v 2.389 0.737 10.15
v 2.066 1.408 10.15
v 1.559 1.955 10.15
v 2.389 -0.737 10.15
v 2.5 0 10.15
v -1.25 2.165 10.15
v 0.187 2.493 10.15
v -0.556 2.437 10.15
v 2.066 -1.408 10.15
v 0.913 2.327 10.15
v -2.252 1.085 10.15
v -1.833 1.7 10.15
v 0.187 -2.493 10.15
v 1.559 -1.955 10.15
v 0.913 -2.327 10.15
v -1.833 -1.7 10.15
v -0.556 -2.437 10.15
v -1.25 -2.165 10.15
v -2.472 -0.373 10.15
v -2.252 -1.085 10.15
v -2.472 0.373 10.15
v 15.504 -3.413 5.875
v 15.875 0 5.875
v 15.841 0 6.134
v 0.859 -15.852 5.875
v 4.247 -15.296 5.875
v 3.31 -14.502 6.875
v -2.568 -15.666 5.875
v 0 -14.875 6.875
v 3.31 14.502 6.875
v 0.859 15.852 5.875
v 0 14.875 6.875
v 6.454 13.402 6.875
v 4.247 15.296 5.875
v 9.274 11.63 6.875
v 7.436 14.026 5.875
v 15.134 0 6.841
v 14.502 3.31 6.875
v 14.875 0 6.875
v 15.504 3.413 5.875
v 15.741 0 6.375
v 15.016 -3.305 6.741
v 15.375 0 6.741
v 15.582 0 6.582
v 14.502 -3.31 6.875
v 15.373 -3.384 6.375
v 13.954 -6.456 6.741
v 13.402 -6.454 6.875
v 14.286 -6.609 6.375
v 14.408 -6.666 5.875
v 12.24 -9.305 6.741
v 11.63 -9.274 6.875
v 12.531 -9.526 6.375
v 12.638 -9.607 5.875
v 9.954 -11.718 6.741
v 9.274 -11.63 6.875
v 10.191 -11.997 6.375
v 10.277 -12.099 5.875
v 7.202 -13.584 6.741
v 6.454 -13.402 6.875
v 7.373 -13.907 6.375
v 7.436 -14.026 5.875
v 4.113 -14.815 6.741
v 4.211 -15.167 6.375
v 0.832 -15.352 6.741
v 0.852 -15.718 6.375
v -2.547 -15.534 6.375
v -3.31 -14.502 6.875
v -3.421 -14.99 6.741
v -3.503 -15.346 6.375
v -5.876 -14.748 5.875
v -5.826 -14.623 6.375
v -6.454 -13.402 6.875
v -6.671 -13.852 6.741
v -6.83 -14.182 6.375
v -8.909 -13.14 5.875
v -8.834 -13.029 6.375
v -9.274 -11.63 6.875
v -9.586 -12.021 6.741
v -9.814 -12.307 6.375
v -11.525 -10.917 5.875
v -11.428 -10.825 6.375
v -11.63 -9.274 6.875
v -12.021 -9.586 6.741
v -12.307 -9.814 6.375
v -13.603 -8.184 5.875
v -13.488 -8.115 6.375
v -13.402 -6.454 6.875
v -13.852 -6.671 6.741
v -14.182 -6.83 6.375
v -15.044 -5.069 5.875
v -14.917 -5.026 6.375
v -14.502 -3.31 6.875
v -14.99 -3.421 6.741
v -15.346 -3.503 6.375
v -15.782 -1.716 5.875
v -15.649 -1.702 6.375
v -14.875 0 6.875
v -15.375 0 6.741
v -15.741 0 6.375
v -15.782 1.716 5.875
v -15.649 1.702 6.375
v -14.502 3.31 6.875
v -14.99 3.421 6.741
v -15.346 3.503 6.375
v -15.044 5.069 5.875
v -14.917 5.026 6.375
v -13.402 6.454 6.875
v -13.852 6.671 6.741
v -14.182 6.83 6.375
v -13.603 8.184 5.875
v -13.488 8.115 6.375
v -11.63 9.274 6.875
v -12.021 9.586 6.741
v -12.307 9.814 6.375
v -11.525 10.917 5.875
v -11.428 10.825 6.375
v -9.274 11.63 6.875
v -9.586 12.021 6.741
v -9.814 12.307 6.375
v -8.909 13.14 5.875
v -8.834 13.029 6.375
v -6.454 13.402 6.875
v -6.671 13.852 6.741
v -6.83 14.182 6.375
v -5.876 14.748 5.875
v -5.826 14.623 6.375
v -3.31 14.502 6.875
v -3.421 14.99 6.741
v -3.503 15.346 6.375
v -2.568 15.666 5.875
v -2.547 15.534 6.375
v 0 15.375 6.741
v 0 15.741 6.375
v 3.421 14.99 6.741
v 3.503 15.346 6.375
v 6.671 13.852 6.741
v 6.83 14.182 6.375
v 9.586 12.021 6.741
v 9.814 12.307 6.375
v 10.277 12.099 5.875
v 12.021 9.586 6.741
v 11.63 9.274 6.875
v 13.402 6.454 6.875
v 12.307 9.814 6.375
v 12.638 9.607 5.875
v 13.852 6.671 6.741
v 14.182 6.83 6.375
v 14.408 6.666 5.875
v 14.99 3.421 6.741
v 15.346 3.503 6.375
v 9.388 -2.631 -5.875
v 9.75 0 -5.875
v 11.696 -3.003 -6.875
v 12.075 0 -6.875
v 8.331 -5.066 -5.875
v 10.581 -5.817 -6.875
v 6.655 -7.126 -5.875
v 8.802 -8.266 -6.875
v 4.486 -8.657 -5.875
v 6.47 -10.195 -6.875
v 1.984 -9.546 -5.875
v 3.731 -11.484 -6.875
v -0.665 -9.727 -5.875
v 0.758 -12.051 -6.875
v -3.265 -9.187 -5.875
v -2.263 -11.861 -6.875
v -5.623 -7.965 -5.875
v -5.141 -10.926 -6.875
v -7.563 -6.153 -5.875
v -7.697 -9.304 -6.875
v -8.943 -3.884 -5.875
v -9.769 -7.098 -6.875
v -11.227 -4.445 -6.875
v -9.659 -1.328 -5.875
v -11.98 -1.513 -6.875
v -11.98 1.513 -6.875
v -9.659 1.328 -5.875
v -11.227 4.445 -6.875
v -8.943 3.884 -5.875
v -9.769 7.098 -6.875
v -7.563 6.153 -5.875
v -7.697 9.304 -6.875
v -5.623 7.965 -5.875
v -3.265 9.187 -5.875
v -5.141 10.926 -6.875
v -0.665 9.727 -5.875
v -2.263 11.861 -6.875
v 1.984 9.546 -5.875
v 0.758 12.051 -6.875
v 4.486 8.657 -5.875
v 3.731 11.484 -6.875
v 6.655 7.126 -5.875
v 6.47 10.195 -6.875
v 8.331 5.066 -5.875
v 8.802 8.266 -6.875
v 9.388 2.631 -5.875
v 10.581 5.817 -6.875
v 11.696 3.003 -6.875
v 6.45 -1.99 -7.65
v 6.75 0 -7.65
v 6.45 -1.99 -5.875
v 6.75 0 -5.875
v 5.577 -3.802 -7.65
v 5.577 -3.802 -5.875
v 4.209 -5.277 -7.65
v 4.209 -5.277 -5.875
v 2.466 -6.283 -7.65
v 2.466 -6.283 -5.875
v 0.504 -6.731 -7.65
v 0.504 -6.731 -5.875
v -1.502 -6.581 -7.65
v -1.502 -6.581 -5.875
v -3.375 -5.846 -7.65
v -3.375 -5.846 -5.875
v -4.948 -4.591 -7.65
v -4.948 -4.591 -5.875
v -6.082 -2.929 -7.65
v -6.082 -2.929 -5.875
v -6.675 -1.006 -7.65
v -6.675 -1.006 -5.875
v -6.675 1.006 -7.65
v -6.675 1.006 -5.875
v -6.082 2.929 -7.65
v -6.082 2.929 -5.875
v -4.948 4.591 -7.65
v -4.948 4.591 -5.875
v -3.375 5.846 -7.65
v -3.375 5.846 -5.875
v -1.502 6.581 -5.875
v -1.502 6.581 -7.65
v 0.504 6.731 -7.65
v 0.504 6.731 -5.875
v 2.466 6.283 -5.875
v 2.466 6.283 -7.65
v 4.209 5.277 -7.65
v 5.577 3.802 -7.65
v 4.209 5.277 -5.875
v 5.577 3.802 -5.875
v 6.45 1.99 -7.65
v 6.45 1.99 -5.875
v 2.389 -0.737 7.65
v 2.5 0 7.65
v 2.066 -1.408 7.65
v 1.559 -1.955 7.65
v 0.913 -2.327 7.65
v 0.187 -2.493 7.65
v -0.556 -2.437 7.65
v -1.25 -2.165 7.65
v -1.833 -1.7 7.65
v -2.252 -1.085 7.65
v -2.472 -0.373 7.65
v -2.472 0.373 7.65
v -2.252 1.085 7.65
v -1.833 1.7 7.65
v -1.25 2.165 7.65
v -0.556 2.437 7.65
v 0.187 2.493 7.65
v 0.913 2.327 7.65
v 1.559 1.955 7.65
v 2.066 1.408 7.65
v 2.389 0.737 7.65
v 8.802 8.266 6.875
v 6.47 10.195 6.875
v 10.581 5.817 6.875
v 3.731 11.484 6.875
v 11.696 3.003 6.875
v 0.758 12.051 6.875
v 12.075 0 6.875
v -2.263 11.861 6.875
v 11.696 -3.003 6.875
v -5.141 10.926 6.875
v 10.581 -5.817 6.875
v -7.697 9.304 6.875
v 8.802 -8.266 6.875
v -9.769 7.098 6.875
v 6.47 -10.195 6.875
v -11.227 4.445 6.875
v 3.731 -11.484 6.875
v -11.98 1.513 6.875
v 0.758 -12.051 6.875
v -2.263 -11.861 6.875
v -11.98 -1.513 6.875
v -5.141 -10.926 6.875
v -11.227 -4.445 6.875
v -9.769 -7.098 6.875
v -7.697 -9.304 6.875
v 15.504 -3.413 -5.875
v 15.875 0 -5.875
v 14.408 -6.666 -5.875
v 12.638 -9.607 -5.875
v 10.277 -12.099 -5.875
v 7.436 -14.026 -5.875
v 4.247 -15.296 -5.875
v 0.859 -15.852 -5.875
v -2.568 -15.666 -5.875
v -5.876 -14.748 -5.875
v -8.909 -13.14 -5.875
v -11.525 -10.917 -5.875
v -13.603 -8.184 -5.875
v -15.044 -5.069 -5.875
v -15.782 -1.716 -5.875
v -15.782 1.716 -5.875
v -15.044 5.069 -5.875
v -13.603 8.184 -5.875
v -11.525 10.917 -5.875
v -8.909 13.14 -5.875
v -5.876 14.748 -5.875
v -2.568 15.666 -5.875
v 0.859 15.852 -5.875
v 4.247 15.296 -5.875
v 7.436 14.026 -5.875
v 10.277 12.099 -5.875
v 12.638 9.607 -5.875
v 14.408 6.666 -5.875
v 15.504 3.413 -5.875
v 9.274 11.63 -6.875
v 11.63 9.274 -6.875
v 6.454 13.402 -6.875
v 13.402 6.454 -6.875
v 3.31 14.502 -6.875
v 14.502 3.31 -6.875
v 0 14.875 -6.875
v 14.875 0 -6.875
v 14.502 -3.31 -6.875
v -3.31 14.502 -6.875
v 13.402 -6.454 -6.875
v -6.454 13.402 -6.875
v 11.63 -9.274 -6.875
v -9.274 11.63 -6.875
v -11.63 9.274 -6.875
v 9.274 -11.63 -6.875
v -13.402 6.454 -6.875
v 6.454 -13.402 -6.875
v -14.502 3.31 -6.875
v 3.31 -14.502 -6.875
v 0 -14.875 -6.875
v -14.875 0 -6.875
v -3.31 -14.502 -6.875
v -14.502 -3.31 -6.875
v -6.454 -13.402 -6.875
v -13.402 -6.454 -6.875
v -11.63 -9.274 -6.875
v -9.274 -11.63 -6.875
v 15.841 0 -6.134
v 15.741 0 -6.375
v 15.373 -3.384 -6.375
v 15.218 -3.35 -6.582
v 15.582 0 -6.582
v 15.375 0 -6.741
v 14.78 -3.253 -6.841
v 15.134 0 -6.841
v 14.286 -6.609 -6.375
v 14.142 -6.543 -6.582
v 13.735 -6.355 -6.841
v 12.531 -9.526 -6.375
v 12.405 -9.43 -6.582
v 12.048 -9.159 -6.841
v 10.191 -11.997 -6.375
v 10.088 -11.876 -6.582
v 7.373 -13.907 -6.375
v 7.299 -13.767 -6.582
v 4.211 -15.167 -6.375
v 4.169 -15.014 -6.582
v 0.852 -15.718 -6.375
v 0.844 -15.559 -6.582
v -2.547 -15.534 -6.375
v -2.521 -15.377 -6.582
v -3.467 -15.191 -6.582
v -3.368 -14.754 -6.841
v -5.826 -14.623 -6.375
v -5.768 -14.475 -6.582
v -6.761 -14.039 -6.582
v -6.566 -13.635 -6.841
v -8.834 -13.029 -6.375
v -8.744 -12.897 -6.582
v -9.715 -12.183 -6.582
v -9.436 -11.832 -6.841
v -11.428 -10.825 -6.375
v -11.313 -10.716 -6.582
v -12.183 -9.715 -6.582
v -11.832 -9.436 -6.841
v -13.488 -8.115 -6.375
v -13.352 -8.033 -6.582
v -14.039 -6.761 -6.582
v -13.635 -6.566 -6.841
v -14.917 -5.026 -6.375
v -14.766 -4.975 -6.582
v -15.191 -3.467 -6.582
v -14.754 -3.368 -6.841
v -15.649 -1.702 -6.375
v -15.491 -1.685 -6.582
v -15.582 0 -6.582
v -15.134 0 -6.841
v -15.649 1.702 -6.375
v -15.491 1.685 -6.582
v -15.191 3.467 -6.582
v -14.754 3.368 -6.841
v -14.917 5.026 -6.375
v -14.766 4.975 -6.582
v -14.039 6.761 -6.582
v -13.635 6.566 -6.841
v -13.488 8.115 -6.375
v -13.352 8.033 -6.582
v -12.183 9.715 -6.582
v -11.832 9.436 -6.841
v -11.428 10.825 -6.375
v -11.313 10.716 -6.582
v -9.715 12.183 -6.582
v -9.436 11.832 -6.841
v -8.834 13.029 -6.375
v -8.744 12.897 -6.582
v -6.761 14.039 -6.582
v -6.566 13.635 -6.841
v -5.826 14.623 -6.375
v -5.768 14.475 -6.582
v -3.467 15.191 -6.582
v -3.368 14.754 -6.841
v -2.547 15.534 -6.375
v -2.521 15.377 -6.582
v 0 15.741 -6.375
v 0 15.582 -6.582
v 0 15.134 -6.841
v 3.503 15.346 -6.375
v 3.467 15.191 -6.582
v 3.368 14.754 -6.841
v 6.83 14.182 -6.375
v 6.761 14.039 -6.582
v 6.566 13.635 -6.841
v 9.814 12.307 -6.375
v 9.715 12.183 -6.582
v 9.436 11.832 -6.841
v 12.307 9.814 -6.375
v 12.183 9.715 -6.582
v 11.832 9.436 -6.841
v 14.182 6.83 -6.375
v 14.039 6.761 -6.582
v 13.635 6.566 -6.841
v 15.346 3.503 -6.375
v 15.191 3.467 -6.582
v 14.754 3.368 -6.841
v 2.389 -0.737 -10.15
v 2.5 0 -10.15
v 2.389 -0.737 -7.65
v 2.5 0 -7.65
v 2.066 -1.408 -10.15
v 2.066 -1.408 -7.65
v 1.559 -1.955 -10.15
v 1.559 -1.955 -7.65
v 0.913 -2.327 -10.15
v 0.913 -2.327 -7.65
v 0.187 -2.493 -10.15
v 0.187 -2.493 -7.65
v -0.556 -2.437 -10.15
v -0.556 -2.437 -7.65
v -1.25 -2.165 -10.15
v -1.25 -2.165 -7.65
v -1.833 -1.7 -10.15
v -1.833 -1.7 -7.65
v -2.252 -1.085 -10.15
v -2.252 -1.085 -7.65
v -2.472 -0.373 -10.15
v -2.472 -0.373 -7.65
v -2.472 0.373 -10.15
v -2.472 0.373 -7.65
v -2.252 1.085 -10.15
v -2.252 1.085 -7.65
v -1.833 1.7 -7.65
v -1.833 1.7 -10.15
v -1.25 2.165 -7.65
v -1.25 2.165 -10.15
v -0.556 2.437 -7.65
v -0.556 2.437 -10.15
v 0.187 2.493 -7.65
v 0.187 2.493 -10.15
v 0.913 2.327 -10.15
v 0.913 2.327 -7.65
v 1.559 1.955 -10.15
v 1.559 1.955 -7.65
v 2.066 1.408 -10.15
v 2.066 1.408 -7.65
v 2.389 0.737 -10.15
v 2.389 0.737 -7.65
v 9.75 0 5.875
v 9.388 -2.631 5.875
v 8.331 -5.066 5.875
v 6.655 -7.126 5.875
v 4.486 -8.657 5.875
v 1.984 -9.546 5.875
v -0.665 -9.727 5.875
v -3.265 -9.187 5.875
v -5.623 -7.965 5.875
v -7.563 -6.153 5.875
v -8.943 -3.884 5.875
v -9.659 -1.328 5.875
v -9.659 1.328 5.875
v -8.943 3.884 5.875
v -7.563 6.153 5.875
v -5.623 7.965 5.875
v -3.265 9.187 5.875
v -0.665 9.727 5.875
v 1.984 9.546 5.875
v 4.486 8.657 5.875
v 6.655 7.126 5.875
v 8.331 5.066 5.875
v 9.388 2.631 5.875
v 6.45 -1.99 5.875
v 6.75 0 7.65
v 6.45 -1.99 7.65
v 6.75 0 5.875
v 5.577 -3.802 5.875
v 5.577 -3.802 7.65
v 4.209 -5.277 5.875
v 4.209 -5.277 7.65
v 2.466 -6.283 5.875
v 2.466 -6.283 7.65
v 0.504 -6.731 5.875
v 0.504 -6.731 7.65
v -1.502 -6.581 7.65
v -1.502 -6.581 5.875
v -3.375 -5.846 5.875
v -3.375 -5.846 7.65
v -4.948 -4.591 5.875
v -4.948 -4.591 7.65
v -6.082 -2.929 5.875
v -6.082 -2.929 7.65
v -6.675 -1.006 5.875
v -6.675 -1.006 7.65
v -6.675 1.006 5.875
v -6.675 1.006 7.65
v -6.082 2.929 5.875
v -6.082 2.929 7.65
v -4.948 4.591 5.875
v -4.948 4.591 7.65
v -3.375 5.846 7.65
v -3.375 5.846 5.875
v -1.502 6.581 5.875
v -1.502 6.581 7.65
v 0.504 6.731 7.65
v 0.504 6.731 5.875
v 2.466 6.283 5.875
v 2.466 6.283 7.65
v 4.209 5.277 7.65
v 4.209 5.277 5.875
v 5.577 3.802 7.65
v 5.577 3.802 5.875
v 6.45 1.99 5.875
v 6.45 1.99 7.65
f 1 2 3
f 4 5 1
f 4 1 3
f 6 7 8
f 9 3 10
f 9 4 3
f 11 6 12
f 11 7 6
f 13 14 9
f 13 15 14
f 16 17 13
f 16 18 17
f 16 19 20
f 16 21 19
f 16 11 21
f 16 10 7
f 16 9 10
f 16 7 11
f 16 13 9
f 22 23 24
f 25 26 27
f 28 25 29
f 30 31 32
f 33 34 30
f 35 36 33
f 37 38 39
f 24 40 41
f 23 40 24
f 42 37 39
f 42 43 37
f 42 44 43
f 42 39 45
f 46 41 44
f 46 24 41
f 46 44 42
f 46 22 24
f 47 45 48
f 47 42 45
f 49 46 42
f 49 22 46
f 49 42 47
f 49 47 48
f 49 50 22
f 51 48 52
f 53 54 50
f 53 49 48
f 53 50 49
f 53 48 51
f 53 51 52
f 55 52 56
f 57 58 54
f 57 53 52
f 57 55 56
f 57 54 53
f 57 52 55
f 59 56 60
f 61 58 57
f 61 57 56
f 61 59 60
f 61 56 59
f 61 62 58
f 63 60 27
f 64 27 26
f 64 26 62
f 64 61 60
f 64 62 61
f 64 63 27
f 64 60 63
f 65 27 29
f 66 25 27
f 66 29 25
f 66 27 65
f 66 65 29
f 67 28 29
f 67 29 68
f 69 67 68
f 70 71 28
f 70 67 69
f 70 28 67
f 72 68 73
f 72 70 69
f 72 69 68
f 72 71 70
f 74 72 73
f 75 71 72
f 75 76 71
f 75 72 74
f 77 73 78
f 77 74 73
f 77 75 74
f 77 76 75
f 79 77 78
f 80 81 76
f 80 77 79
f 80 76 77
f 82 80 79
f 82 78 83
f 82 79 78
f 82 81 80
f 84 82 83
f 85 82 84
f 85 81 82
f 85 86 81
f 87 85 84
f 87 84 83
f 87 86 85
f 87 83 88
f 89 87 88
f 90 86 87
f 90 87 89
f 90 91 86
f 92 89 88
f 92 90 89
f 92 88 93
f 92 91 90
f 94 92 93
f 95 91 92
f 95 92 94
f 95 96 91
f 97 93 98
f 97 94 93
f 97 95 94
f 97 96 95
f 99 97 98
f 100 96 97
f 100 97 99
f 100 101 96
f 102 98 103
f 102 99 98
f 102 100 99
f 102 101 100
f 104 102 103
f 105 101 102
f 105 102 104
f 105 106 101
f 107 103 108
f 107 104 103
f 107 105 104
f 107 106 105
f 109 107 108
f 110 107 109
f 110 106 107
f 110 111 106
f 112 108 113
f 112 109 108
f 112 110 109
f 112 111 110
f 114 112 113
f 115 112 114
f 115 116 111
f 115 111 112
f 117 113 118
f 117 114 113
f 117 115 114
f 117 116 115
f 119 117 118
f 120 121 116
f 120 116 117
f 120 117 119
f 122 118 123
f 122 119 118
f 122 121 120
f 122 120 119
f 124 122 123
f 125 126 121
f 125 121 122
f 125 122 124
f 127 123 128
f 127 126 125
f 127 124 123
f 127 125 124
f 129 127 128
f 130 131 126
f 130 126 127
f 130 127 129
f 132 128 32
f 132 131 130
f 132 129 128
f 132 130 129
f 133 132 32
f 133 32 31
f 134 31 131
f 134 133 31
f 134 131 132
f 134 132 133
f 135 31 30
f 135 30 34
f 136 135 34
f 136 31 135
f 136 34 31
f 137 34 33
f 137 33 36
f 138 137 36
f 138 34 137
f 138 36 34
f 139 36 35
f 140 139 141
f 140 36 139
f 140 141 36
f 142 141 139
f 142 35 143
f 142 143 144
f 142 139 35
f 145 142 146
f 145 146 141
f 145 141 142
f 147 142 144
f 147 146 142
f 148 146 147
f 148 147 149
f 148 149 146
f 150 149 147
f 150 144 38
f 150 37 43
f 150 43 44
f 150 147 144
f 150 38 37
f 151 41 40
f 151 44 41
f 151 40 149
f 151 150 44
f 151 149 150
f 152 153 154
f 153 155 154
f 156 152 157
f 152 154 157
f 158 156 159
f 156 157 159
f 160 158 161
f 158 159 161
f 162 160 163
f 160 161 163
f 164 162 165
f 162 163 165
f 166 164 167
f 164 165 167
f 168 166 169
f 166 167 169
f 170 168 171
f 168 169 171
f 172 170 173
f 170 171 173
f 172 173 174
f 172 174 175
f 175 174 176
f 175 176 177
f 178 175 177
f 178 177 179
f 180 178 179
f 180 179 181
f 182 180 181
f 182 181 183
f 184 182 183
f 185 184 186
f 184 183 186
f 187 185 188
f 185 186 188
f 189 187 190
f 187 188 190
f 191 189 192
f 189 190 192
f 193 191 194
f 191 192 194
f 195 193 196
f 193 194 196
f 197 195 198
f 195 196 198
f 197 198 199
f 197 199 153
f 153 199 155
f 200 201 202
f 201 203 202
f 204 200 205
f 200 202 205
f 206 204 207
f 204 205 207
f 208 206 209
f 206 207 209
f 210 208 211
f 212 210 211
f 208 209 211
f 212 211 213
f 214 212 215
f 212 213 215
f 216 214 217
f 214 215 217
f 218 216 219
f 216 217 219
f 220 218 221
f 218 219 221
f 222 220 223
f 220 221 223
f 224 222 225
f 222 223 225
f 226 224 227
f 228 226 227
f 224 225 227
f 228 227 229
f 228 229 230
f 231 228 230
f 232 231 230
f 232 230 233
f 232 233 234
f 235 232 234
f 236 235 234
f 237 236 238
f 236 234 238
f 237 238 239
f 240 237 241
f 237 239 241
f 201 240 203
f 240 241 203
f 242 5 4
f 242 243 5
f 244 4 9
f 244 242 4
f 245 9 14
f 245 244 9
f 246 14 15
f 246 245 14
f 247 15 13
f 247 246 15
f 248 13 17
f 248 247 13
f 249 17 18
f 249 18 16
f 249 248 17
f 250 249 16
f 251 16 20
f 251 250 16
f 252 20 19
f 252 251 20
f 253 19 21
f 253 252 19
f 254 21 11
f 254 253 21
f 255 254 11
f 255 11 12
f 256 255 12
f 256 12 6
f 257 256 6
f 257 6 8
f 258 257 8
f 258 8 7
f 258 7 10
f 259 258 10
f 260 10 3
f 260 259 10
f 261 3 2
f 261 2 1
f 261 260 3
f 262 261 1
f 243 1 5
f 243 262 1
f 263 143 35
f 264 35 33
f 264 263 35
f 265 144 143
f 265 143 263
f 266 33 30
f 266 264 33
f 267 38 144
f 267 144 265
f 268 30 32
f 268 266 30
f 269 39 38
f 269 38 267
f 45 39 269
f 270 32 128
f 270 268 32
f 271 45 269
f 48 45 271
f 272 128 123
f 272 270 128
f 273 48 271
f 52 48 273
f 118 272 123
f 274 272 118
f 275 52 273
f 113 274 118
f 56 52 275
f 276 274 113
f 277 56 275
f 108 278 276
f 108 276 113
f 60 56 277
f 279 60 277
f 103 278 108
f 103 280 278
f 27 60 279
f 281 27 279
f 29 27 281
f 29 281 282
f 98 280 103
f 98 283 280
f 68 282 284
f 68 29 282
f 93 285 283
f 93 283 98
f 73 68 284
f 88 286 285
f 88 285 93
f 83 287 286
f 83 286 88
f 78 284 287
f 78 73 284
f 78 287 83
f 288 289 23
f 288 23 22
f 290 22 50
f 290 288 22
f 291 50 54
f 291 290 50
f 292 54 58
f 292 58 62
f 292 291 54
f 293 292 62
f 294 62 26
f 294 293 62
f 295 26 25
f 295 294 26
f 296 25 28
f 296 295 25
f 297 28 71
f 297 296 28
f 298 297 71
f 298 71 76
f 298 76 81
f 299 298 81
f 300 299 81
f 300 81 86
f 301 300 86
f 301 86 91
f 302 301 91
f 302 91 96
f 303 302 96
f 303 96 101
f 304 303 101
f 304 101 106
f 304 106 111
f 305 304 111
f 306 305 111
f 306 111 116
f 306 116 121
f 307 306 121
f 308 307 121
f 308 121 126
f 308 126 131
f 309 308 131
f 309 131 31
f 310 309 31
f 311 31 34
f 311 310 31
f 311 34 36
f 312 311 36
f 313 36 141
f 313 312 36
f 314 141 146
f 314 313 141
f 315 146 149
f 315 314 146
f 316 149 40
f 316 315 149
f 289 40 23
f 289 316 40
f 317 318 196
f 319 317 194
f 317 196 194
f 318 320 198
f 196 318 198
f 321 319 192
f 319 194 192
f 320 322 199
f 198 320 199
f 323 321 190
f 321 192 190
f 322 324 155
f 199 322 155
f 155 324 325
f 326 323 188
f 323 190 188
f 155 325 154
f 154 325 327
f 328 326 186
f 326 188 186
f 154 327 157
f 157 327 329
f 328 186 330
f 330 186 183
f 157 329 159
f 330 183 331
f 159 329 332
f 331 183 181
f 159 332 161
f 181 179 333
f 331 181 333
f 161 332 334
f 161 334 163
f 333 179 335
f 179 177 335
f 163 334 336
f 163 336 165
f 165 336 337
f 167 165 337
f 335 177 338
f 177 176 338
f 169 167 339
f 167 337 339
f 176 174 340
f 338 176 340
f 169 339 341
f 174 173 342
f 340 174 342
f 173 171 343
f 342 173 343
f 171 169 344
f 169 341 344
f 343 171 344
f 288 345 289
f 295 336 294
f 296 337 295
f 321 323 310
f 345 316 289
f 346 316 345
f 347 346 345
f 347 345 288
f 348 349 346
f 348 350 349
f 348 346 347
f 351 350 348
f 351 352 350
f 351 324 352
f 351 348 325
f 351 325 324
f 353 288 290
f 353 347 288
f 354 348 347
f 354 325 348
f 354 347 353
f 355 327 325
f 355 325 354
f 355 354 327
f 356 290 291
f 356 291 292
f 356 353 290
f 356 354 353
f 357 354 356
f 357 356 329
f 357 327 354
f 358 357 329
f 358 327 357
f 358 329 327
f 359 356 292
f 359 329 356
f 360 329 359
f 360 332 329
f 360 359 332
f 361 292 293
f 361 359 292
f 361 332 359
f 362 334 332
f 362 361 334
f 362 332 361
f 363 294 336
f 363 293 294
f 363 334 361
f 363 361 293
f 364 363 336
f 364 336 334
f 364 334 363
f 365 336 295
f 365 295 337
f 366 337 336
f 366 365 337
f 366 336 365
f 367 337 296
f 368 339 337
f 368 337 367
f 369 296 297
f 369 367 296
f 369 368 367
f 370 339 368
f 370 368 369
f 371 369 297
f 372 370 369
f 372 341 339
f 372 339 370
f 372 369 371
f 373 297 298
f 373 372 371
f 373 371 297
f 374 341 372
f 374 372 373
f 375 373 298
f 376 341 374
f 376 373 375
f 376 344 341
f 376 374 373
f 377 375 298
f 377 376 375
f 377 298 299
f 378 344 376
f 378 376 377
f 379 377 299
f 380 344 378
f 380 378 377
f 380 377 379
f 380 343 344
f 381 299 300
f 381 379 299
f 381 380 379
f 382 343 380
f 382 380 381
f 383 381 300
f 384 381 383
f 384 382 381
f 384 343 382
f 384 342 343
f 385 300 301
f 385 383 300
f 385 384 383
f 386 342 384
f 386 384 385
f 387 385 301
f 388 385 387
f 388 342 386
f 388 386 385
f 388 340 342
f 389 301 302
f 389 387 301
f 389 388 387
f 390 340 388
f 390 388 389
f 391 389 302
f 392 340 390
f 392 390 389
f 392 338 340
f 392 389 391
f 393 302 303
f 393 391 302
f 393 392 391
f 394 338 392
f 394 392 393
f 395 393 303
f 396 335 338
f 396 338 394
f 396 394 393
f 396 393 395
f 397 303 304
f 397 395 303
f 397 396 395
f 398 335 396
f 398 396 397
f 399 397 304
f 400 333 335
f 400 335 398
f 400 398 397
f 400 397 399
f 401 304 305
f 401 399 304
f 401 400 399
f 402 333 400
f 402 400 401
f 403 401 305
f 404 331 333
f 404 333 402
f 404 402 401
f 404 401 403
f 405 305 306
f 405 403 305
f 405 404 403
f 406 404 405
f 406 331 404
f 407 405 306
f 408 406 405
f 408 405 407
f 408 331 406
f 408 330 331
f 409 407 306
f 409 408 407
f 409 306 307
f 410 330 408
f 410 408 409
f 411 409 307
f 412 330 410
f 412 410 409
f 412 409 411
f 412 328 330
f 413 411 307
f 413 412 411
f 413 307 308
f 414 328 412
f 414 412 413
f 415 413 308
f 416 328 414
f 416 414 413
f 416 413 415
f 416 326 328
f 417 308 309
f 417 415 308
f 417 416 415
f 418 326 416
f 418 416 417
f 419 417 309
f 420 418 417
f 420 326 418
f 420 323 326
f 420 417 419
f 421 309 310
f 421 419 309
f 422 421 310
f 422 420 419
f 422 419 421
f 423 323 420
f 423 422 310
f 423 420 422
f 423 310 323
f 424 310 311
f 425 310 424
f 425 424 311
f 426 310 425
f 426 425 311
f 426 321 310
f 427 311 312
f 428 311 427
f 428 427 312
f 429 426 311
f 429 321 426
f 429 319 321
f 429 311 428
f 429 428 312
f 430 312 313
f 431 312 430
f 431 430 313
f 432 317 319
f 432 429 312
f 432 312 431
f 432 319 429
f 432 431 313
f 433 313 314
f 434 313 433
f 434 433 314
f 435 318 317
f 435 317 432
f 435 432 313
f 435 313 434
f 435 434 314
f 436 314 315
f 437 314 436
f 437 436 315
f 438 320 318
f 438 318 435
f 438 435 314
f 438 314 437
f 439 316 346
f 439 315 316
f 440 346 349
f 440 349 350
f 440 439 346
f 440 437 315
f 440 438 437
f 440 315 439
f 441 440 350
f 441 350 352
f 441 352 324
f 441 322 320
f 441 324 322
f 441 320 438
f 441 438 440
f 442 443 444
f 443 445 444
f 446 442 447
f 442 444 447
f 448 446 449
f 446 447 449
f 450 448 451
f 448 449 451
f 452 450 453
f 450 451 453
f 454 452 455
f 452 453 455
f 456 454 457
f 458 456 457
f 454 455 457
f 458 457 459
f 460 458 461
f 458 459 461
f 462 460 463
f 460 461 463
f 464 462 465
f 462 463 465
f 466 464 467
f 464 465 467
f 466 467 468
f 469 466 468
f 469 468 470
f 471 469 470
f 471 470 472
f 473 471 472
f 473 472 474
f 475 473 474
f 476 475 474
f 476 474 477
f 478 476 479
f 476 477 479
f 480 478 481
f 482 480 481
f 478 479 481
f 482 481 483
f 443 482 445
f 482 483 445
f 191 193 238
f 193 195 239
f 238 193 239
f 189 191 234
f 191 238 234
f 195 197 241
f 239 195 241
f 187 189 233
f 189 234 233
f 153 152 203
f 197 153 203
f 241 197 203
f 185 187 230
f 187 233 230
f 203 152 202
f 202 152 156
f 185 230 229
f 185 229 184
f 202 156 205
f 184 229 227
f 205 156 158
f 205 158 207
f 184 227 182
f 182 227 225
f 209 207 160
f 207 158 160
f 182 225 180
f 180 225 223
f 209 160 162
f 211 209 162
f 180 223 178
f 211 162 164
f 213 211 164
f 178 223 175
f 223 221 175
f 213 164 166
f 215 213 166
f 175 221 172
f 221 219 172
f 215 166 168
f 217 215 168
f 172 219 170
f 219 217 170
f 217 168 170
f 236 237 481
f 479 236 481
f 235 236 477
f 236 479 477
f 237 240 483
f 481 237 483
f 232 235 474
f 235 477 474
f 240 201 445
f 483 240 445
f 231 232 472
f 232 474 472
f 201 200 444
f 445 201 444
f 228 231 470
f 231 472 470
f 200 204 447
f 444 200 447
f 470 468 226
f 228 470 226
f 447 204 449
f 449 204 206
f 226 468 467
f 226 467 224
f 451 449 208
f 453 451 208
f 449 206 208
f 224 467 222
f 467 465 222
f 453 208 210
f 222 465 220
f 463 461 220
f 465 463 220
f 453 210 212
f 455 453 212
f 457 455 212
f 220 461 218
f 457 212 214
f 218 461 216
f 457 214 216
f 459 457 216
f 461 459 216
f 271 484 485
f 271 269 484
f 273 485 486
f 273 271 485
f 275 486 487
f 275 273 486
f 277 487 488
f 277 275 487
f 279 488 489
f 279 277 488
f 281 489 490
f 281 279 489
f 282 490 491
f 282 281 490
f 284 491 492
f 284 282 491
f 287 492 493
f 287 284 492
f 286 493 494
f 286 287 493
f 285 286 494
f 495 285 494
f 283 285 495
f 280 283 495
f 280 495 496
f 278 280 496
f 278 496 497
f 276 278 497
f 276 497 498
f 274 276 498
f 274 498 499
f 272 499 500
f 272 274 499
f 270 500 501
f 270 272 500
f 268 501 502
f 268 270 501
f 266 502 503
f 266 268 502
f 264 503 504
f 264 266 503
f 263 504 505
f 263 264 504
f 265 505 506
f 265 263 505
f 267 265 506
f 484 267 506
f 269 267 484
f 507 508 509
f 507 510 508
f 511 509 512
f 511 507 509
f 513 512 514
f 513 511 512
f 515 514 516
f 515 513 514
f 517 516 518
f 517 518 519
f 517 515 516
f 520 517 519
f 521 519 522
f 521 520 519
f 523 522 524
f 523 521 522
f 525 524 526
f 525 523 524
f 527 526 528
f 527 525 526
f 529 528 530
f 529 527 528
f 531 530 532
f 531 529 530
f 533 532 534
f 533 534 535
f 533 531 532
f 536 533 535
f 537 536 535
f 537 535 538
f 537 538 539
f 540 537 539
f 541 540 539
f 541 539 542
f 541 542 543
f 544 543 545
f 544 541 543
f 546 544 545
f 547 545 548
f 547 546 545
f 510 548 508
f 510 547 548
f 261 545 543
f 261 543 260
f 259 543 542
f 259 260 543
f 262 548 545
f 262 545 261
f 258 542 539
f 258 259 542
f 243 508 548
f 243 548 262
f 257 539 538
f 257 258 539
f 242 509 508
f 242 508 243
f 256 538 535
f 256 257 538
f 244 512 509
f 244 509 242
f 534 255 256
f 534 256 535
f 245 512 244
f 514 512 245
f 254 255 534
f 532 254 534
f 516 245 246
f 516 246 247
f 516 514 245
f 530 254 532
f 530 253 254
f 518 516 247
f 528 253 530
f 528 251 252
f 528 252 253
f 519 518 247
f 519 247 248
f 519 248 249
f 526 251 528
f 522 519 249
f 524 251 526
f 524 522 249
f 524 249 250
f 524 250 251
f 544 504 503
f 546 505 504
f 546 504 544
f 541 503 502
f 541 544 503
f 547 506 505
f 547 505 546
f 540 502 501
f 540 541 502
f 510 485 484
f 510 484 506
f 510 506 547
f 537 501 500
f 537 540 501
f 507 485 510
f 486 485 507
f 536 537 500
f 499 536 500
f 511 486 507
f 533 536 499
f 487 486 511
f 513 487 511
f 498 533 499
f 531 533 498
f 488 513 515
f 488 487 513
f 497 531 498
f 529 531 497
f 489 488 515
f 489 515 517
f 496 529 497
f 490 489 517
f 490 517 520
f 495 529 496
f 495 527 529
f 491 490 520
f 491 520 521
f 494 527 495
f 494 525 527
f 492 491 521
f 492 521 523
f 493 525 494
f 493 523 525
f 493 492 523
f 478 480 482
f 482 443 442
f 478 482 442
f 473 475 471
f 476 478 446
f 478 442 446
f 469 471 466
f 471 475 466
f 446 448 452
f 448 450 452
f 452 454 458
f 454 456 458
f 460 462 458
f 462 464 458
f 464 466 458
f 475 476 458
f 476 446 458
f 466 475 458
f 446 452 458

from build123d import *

# Parameters (mm, degrees)
FILLET1_R = 1


with BuildPart() as part:
    # Sketch3 → Revolve1 (revolve)
    with BuildSketch(Plane(origin=(0, 0, 0), x_dir=(1, 0, 0), z_dir=(0, 1, 0))):
        Polygon((6.75, 7.65), (6.75, 5.875), (9.75, 5.875), (12.075, 6.875), (15.875, 6.875), (15.875, 0), (0, 0), (0, 10.15), (2.5, 10.15), (2.5, 7.65), align=None)
    revolve1 = revolve(axis=Axis((0, 0, 0), (0, 0, -1)))

    # Mirror1: Revolve1 across plane
    add(revolve1.mirror(Plane.XY))

    # Fillet1
    fillet1_edges = [part.edges().sort_by_distance(p)[0] for p in [
        (-15.875, 0, 6.875),
        (-15.875, 0, -6.875),
    ]]
    fillet(fillet1_edges, radius=FILLET1_R)


solid = part.part
